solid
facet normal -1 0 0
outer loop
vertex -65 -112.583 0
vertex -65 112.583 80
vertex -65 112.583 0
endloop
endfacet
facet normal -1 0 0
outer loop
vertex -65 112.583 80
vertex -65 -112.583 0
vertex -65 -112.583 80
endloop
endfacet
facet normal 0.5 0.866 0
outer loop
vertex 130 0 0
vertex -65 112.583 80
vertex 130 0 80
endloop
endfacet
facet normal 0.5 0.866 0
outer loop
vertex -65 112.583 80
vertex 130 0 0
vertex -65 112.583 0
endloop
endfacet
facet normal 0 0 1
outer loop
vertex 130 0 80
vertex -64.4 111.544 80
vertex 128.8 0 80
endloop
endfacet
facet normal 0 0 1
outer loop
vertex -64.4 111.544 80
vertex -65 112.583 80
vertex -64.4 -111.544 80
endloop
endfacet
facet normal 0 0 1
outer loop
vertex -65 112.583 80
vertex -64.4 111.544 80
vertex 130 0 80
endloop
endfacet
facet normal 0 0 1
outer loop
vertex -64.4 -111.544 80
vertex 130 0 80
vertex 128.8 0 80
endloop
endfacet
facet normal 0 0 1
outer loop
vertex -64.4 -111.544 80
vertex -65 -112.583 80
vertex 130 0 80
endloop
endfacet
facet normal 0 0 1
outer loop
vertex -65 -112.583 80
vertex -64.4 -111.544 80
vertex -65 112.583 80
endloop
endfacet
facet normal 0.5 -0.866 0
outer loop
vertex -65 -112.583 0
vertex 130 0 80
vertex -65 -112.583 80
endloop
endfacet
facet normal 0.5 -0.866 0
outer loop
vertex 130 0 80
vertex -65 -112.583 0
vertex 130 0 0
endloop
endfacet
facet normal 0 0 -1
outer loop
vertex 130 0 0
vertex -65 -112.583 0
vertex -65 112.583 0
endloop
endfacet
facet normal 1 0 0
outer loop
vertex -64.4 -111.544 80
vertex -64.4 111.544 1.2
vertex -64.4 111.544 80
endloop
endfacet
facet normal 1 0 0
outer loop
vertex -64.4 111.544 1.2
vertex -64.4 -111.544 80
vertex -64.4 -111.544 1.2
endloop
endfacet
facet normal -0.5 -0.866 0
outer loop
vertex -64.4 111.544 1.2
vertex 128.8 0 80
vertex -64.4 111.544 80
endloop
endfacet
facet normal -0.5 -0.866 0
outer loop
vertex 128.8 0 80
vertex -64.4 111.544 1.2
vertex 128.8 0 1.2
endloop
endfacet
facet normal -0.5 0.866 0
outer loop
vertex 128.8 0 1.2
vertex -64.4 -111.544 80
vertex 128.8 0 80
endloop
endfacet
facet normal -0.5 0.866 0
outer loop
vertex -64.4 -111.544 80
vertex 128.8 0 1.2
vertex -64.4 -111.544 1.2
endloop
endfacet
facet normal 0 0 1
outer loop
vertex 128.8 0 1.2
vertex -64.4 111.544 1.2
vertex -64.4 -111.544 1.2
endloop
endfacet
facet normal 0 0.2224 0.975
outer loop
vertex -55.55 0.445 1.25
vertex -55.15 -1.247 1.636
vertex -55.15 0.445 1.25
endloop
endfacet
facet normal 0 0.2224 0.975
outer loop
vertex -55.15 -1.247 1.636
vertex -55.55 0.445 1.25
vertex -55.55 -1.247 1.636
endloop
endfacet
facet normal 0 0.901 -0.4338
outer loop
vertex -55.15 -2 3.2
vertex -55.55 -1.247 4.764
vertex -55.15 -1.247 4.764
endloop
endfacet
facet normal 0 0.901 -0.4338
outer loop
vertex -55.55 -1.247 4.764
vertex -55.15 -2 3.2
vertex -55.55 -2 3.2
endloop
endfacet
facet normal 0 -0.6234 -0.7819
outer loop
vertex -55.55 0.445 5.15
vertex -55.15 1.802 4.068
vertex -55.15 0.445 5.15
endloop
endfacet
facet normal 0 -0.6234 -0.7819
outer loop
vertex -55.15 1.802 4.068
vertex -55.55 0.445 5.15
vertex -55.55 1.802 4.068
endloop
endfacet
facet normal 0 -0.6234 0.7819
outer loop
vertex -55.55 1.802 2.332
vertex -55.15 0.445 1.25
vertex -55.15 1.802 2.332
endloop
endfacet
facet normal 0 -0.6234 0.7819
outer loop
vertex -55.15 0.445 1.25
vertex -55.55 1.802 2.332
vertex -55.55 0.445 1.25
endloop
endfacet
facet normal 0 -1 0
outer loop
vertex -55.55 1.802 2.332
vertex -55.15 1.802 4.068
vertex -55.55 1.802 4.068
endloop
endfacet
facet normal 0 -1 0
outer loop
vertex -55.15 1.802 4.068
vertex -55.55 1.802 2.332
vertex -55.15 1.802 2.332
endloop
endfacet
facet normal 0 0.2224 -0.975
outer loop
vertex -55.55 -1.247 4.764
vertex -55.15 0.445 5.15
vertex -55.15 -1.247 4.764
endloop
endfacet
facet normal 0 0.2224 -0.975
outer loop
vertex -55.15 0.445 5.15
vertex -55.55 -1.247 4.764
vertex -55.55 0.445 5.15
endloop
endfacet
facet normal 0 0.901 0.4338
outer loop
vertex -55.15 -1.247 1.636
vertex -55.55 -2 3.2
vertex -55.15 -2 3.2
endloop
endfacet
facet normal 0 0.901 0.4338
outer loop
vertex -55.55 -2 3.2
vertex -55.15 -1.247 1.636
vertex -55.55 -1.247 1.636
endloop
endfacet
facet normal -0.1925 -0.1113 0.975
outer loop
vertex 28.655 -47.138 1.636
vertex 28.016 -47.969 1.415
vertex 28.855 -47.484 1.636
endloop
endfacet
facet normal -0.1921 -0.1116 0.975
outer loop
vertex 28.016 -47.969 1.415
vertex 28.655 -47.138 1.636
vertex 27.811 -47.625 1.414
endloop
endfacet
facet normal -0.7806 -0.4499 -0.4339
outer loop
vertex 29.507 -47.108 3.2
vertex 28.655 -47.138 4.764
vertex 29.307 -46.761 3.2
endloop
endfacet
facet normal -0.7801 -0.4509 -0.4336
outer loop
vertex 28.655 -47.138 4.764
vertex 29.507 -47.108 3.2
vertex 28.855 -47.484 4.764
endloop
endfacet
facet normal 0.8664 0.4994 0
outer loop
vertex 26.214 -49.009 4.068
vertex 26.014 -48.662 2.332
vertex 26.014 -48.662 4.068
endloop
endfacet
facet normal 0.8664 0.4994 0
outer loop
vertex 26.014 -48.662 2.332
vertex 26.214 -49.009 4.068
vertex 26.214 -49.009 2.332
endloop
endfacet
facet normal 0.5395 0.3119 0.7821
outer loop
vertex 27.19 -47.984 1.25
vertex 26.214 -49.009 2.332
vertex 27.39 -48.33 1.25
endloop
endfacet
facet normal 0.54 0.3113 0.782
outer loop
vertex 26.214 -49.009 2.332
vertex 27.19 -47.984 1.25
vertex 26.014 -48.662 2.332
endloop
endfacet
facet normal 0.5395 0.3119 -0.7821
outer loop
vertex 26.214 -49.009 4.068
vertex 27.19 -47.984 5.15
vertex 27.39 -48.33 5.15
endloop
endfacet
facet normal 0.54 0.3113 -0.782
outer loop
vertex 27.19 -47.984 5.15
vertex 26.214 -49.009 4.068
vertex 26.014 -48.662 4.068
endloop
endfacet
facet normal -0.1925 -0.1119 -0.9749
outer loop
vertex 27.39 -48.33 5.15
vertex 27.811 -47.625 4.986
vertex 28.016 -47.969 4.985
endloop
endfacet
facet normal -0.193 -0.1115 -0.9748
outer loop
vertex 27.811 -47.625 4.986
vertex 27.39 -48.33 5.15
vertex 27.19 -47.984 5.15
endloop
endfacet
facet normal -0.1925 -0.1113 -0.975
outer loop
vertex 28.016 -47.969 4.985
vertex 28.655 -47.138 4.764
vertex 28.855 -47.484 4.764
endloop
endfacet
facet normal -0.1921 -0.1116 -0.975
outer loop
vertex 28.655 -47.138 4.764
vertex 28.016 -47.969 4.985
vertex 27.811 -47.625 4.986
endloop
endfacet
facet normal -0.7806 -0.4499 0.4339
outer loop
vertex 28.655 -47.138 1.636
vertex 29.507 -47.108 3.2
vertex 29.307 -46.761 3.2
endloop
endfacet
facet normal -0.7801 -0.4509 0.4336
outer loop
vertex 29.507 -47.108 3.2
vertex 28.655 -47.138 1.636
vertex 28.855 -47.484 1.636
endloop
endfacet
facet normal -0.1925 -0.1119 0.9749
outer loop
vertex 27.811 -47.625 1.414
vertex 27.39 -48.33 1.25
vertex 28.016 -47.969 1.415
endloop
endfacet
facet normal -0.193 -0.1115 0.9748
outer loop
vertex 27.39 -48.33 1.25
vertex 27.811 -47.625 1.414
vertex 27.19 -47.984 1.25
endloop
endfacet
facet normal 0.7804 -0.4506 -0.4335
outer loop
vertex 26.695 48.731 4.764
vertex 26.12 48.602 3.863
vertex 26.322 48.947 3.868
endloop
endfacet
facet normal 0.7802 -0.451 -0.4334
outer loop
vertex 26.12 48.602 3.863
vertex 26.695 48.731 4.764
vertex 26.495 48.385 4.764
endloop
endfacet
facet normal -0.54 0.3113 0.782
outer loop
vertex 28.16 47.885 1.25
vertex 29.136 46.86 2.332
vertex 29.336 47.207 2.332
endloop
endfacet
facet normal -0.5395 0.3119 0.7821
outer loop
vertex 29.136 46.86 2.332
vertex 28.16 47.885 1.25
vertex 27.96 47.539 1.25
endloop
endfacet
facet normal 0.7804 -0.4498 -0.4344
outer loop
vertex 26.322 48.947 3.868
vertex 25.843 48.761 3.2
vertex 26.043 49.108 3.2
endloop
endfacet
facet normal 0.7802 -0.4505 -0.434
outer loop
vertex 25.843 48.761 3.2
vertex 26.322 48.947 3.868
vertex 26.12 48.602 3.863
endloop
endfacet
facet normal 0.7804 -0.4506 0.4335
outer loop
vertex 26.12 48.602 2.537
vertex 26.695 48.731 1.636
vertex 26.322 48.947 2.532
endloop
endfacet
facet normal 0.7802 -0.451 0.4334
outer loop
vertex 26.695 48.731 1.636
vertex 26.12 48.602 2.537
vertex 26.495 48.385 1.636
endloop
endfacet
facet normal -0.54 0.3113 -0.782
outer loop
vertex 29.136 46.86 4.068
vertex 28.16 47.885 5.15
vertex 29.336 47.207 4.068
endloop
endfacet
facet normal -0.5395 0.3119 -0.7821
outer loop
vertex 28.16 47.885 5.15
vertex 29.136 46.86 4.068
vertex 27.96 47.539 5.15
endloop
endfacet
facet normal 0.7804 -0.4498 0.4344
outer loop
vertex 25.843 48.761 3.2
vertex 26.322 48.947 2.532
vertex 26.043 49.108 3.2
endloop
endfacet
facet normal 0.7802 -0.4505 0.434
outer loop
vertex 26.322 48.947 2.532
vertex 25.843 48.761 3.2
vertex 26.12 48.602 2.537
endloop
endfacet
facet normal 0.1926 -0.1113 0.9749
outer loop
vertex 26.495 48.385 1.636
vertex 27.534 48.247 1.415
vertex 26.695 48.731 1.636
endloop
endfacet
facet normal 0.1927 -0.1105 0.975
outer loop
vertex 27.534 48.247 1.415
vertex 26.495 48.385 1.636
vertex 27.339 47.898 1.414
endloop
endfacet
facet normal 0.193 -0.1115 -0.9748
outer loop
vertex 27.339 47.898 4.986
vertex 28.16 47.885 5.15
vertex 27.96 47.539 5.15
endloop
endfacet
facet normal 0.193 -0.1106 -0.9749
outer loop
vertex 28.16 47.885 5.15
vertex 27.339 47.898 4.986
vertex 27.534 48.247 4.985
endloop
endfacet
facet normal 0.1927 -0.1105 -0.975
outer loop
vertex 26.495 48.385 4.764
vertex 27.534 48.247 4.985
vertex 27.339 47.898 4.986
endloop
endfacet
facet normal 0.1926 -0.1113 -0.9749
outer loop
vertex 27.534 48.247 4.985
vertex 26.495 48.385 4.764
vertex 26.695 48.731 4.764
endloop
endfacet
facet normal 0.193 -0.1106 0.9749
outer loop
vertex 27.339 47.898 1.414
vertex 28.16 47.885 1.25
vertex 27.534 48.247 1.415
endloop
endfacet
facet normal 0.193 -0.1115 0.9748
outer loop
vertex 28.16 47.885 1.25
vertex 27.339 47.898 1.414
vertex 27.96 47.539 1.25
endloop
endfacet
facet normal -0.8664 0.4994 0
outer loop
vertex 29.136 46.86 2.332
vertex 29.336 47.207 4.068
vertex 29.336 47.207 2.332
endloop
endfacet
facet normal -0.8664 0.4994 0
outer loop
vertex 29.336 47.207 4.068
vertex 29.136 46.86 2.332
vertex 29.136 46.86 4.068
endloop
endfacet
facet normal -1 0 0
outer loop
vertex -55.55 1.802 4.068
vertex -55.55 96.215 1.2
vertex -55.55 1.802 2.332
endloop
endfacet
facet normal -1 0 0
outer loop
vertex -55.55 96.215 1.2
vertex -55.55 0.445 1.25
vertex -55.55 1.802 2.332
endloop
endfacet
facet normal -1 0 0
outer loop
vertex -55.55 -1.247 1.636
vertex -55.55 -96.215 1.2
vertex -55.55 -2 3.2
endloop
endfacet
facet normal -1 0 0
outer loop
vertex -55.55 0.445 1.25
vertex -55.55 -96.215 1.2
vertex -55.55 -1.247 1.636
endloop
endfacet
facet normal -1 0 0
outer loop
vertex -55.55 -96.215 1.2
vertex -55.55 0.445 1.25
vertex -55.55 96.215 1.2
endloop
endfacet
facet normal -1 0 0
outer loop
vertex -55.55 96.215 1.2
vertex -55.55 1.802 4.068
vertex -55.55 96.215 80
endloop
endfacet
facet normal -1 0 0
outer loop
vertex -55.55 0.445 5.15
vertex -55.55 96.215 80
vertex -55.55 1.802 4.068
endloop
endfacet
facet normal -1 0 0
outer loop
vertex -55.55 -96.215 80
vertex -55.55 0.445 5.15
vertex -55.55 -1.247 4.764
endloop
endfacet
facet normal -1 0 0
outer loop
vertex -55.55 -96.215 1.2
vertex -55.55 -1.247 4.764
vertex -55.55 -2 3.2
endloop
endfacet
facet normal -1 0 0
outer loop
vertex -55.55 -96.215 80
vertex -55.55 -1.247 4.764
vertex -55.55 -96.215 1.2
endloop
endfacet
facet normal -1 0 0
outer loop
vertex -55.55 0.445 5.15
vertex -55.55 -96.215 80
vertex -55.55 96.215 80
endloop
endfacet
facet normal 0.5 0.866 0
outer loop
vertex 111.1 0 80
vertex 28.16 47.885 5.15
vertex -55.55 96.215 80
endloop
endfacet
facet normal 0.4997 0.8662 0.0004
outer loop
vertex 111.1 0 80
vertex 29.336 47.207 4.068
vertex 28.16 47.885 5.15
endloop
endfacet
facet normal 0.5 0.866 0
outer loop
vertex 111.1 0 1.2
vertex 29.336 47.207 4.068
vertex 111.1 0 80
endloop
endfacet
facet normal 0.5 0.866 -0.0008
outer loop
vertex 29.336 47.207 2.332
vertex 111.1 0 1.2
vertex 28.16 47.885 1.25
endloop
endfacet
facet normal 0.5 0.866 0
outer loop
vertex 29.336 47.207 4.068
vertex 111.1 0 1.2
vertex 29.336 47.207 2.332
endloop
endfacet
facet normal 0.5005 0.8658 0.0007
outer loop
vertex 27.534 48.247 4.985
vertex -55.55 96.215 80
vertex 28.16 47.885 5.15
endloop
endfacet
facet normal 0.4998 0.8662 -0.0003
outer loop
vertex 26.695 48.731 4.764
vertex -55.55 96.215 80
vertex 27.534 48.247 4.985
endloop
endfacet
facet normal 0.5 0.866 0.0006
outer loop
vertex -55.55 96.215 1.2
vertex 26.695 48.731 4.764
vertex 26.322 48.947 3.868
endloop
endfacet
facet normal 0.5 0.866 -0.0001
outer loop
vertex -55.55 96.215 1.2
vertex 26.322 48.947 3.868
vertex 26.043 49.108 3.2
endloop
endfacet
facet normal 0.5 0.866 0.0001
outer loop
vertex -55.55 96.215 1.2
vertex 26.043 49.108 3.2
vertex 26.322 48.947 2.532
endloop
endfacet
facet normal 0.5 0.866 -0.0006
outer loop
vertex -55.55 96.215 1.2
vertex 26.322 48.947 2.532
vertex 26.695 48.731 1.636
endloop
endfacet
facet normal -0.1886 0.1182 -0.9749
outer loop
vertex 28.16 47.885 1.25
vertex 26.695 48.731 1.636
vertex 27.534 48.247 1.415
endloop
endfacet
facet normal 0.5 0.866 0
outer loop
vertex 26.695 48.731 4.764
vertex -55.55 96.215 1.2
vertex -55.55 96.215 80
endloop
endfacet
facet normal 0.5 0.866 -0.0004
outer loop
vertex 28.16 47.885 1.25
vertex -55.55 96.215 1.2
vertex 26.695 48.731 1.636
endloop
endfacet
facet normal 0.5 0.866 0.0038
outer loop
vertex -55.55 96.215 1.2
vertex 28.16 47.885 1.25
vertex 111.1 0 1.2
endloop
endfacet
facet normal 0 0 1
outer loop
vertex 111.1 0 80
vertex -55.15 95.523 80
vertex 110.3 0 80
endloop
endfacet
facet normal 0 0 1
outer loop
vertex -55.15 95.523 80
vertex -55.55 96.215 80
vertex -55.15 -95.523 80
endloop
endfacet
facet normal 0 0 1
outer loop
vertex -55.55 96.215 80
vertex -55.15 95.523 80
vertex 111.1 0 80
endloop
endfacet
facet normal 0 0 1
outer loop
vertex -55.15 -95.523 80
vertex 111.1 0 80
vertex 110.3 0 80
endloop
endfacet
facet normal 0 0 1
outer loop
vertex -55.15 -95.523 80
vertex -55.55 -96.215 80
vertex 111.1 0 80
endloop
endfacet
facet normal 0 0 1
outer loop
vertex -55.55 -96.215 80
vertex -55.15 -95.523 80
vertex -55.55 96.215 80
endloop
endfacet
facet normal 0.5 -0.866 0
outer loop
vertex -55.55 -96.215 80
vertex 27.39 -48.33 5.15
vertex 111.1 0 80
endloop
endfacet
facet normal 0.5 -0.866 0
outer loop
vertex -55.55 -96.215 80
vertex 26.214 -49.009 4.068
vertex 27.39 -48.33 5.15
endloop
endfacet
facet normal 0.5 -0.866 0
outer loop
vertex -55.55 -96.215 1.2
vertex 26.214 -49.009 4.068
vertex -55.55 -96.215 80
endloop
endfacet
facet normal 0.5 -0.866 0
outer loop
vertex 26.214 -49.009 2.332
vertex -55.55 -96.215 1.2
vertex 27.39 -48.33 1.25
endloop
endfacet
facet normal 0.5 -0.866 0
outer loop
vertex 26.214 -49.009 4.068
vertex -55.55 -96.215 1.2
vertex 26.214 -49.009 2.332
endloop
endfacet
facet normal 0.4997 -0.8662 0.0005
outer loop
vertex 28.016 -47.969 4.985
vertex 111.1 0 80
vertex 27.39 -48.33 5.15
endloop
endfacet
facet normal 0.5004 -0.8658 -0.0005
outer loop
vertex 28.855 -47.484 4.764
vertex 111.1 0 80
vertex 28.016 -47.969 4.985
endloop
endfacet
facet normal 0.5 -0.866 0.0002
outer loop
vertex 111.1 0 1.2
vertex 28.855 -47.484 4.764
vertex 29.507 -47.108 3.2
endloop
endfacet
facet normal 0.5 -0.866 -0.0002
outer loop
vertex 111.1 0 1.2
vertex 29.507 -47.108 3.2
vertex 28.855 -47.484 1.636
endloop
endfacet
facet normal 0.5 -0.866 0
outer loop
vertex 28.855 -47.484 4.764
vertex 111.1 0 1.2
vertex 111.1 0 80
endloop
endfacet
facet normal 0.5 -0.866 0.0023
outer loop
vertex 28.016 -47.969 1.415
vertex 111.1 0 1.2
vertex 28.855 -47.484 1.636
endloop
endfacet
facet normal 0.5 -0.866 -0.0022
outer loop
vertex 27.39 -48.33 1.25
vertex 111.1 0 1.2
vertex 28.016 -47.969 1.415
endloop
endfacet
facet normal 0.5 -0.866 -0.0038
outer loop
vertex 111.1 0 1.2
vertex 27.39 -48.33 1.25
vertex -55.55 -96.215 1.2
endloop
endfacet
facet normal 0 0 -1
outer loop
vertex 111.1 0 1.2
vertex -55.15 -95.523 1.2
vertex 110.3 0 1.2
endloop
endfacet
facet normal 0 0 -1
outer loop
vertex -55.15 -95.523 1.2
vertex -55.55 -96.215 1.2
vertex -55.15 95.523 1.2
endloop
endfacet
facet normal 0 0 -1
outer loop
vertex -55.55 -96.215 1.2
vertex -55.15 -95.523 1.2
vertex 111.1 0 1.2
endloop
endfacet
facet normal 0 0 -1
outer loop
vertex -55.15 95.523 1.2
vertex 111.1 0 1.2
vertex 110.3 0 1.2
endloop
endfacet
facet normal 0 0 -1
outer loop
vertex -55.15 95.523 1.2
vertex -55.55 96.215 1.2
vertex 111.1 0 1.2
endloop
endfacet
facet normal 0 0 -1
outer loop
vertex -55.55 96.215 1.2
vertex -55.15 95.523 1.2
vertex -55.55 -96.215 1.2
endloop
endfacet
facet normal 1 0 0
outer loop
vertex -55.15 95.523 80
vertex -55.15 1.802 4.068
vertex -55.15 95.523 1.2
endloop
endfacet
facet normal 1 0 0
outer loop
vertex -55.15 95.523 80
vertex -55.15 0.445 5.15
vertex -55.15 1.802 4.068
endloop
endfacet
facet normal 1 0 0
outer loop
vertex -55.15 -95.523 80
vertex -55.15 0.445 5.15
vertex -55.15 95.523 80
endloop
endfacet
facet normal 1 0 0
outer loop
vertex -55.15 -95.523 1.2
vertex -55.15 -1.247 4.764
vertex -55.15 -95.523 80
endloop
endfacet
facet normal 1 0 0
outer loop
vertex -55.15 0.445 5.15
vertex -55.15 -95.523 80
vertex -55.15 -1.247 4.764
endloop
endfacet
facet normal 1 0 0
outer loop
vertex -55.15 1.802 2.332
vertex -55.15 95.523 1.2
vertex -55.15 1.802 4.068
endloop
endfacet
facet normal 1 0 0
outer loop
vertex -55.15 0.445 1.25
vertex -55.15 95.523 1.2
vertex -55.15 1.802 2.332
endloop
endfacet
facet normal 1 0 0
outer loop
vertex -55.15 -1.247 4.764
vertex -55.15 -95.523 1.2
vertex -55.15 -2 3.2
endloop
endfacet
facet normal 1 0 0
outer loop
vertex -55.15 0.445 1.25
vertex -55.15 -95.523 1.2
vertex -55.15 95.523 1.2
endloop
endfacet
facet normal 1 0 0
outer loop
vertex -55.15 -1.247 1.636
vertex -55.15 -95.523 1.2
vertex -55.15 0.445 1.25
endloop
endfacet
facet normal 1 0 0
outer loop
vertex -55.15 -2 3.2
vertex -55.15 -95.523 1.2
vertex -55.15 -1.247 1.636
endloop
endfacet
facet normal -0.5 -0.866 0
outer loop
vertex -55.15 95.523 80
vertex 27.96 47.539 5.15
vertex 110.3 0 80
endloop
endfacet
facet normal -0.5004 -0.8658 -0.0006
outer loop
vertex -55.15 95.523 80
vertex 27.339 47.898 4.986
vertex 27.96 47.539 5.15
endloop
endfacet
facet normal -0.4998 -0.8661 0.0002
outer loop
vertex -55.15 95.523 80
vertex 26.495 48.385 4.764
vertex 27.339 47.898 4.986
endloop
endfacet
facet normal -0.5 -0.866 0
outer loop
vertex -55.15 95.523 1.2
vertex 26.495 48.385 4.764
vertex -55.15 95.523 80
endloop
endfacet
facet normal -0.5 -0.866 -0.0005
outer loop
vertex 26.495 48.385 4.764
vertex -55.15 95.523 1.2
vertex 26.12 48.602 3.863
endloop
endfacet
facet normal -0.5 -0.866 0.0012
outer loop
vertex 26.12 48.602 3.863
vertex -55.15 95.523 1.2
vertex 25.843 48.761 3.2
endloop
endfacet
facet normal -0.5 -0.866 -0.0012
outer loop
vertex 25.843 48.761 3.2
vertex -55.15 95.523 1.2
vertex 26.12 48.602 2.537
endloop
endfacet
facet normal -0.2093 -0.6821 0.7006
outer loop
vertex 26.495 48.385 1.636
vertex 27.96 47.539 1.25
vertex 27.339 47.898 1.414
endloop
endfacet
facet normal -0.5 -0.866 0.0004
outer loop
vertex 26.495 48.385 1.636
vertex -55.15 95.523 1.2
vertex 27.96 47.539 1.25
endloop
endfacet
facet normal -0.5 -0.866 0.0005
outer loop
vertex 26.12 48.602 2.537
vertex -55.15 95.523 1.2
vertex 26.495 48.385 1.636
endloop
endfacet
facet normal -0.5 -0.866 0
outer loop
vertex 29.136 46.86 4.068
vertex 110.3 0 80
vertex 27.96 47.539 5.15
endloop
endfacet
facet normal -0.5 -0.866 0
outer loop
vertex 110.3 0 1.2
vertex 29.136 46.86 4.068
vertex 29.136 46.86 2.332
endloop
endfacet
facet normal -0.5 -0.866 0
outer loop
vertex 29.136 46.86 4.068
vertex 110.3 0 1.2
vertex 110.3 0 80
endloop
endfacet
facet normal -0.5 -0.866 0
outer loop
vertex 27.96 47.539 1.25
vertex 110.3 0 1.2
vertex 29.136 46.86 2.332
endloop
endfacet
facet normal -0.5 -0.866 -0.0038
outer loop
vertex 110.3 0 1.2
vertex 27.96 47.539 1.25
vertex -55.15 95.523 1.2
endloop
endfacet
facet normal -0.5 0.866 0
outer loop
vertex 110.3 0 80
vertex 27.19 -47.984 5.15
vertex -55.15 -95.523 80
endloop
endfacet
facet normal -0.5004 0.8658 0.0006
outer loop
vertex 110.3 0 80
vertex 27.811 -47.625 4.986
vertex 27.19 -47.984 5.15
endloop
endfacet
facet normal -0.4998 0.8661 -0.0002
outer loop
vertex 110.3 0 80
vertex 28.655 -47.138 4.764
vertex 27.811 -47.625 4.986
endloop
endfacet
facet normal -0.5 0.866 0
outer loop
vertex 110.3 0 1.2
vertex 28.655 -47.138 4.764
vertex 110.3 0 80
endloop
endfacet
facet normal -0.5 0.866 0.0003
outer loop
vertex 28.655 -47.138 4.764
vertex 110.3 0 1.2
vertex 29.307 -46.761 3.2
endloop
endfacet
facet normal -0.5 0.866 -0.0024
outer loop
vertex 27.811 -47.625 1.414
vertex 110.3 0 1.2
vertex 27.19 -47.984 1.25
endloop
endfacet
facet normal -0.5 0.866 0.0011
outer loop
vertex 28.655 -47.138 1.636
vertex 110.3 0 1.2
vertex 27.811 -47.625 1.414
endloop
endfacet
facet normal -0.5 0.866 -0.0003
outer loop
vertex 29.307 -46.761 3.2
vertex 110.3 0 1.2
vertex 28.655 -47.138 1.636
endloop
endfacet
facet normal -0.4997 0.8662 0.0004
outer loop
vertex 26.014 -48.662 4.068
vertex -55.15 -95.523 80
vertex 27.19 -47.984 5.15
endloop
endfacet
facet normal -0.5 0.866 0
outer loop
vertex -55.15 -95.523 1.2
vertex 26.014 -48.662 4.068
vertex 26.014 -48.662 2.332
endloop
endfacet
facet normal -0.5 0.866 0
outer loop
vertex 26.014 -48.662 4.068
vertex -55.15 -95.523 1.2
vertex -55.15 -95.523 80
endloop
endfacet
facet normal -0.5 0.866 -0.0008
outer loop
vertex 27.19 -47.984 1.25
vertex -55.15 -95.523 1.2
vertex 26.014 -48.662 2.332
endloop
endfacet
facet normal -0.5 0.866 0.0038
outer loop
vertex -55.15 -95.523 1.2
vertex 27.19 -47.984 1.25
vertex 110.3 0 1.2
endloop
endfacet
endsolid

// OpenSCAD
//strength of outer walls
so = 1.2;
//strength of inner walls
si = 0.8;


//error of printer in mm
e = 0.3;

//height
h = 80;

//outer width
w = 260;
//inner width (width of soil holder)
wi = 220;

//number of edges
ne = 3;

//number of water holes
nwh = ne;
//water hole radius
whr = 2;


//do not change this
r = w/2;
//do not change this
ri = wi/2;

//half degree
hd = (360/ne)/2;

    difference() {
    //main cylinder
    cylinder(h,r,r,$fn=ne);
    //main cutout
    translate([0,0,so]) cylinder(h,r-so,r-so,$fn=ne);    
    }
    
    translate([0,0,so]) 
        difference() {
            cylinder(h-so,ri+si+e,ri+si+e,$fn=ne);
            cylinder(h,ri+e,ri+e,$fn=ne);
            
            for(i = [-90:360/nwh:269]) {
                echo(i);
                translate([0,0,whr])rotate([90,0,i])cylinder(r,whr,whr);
            }
               

            
        }
